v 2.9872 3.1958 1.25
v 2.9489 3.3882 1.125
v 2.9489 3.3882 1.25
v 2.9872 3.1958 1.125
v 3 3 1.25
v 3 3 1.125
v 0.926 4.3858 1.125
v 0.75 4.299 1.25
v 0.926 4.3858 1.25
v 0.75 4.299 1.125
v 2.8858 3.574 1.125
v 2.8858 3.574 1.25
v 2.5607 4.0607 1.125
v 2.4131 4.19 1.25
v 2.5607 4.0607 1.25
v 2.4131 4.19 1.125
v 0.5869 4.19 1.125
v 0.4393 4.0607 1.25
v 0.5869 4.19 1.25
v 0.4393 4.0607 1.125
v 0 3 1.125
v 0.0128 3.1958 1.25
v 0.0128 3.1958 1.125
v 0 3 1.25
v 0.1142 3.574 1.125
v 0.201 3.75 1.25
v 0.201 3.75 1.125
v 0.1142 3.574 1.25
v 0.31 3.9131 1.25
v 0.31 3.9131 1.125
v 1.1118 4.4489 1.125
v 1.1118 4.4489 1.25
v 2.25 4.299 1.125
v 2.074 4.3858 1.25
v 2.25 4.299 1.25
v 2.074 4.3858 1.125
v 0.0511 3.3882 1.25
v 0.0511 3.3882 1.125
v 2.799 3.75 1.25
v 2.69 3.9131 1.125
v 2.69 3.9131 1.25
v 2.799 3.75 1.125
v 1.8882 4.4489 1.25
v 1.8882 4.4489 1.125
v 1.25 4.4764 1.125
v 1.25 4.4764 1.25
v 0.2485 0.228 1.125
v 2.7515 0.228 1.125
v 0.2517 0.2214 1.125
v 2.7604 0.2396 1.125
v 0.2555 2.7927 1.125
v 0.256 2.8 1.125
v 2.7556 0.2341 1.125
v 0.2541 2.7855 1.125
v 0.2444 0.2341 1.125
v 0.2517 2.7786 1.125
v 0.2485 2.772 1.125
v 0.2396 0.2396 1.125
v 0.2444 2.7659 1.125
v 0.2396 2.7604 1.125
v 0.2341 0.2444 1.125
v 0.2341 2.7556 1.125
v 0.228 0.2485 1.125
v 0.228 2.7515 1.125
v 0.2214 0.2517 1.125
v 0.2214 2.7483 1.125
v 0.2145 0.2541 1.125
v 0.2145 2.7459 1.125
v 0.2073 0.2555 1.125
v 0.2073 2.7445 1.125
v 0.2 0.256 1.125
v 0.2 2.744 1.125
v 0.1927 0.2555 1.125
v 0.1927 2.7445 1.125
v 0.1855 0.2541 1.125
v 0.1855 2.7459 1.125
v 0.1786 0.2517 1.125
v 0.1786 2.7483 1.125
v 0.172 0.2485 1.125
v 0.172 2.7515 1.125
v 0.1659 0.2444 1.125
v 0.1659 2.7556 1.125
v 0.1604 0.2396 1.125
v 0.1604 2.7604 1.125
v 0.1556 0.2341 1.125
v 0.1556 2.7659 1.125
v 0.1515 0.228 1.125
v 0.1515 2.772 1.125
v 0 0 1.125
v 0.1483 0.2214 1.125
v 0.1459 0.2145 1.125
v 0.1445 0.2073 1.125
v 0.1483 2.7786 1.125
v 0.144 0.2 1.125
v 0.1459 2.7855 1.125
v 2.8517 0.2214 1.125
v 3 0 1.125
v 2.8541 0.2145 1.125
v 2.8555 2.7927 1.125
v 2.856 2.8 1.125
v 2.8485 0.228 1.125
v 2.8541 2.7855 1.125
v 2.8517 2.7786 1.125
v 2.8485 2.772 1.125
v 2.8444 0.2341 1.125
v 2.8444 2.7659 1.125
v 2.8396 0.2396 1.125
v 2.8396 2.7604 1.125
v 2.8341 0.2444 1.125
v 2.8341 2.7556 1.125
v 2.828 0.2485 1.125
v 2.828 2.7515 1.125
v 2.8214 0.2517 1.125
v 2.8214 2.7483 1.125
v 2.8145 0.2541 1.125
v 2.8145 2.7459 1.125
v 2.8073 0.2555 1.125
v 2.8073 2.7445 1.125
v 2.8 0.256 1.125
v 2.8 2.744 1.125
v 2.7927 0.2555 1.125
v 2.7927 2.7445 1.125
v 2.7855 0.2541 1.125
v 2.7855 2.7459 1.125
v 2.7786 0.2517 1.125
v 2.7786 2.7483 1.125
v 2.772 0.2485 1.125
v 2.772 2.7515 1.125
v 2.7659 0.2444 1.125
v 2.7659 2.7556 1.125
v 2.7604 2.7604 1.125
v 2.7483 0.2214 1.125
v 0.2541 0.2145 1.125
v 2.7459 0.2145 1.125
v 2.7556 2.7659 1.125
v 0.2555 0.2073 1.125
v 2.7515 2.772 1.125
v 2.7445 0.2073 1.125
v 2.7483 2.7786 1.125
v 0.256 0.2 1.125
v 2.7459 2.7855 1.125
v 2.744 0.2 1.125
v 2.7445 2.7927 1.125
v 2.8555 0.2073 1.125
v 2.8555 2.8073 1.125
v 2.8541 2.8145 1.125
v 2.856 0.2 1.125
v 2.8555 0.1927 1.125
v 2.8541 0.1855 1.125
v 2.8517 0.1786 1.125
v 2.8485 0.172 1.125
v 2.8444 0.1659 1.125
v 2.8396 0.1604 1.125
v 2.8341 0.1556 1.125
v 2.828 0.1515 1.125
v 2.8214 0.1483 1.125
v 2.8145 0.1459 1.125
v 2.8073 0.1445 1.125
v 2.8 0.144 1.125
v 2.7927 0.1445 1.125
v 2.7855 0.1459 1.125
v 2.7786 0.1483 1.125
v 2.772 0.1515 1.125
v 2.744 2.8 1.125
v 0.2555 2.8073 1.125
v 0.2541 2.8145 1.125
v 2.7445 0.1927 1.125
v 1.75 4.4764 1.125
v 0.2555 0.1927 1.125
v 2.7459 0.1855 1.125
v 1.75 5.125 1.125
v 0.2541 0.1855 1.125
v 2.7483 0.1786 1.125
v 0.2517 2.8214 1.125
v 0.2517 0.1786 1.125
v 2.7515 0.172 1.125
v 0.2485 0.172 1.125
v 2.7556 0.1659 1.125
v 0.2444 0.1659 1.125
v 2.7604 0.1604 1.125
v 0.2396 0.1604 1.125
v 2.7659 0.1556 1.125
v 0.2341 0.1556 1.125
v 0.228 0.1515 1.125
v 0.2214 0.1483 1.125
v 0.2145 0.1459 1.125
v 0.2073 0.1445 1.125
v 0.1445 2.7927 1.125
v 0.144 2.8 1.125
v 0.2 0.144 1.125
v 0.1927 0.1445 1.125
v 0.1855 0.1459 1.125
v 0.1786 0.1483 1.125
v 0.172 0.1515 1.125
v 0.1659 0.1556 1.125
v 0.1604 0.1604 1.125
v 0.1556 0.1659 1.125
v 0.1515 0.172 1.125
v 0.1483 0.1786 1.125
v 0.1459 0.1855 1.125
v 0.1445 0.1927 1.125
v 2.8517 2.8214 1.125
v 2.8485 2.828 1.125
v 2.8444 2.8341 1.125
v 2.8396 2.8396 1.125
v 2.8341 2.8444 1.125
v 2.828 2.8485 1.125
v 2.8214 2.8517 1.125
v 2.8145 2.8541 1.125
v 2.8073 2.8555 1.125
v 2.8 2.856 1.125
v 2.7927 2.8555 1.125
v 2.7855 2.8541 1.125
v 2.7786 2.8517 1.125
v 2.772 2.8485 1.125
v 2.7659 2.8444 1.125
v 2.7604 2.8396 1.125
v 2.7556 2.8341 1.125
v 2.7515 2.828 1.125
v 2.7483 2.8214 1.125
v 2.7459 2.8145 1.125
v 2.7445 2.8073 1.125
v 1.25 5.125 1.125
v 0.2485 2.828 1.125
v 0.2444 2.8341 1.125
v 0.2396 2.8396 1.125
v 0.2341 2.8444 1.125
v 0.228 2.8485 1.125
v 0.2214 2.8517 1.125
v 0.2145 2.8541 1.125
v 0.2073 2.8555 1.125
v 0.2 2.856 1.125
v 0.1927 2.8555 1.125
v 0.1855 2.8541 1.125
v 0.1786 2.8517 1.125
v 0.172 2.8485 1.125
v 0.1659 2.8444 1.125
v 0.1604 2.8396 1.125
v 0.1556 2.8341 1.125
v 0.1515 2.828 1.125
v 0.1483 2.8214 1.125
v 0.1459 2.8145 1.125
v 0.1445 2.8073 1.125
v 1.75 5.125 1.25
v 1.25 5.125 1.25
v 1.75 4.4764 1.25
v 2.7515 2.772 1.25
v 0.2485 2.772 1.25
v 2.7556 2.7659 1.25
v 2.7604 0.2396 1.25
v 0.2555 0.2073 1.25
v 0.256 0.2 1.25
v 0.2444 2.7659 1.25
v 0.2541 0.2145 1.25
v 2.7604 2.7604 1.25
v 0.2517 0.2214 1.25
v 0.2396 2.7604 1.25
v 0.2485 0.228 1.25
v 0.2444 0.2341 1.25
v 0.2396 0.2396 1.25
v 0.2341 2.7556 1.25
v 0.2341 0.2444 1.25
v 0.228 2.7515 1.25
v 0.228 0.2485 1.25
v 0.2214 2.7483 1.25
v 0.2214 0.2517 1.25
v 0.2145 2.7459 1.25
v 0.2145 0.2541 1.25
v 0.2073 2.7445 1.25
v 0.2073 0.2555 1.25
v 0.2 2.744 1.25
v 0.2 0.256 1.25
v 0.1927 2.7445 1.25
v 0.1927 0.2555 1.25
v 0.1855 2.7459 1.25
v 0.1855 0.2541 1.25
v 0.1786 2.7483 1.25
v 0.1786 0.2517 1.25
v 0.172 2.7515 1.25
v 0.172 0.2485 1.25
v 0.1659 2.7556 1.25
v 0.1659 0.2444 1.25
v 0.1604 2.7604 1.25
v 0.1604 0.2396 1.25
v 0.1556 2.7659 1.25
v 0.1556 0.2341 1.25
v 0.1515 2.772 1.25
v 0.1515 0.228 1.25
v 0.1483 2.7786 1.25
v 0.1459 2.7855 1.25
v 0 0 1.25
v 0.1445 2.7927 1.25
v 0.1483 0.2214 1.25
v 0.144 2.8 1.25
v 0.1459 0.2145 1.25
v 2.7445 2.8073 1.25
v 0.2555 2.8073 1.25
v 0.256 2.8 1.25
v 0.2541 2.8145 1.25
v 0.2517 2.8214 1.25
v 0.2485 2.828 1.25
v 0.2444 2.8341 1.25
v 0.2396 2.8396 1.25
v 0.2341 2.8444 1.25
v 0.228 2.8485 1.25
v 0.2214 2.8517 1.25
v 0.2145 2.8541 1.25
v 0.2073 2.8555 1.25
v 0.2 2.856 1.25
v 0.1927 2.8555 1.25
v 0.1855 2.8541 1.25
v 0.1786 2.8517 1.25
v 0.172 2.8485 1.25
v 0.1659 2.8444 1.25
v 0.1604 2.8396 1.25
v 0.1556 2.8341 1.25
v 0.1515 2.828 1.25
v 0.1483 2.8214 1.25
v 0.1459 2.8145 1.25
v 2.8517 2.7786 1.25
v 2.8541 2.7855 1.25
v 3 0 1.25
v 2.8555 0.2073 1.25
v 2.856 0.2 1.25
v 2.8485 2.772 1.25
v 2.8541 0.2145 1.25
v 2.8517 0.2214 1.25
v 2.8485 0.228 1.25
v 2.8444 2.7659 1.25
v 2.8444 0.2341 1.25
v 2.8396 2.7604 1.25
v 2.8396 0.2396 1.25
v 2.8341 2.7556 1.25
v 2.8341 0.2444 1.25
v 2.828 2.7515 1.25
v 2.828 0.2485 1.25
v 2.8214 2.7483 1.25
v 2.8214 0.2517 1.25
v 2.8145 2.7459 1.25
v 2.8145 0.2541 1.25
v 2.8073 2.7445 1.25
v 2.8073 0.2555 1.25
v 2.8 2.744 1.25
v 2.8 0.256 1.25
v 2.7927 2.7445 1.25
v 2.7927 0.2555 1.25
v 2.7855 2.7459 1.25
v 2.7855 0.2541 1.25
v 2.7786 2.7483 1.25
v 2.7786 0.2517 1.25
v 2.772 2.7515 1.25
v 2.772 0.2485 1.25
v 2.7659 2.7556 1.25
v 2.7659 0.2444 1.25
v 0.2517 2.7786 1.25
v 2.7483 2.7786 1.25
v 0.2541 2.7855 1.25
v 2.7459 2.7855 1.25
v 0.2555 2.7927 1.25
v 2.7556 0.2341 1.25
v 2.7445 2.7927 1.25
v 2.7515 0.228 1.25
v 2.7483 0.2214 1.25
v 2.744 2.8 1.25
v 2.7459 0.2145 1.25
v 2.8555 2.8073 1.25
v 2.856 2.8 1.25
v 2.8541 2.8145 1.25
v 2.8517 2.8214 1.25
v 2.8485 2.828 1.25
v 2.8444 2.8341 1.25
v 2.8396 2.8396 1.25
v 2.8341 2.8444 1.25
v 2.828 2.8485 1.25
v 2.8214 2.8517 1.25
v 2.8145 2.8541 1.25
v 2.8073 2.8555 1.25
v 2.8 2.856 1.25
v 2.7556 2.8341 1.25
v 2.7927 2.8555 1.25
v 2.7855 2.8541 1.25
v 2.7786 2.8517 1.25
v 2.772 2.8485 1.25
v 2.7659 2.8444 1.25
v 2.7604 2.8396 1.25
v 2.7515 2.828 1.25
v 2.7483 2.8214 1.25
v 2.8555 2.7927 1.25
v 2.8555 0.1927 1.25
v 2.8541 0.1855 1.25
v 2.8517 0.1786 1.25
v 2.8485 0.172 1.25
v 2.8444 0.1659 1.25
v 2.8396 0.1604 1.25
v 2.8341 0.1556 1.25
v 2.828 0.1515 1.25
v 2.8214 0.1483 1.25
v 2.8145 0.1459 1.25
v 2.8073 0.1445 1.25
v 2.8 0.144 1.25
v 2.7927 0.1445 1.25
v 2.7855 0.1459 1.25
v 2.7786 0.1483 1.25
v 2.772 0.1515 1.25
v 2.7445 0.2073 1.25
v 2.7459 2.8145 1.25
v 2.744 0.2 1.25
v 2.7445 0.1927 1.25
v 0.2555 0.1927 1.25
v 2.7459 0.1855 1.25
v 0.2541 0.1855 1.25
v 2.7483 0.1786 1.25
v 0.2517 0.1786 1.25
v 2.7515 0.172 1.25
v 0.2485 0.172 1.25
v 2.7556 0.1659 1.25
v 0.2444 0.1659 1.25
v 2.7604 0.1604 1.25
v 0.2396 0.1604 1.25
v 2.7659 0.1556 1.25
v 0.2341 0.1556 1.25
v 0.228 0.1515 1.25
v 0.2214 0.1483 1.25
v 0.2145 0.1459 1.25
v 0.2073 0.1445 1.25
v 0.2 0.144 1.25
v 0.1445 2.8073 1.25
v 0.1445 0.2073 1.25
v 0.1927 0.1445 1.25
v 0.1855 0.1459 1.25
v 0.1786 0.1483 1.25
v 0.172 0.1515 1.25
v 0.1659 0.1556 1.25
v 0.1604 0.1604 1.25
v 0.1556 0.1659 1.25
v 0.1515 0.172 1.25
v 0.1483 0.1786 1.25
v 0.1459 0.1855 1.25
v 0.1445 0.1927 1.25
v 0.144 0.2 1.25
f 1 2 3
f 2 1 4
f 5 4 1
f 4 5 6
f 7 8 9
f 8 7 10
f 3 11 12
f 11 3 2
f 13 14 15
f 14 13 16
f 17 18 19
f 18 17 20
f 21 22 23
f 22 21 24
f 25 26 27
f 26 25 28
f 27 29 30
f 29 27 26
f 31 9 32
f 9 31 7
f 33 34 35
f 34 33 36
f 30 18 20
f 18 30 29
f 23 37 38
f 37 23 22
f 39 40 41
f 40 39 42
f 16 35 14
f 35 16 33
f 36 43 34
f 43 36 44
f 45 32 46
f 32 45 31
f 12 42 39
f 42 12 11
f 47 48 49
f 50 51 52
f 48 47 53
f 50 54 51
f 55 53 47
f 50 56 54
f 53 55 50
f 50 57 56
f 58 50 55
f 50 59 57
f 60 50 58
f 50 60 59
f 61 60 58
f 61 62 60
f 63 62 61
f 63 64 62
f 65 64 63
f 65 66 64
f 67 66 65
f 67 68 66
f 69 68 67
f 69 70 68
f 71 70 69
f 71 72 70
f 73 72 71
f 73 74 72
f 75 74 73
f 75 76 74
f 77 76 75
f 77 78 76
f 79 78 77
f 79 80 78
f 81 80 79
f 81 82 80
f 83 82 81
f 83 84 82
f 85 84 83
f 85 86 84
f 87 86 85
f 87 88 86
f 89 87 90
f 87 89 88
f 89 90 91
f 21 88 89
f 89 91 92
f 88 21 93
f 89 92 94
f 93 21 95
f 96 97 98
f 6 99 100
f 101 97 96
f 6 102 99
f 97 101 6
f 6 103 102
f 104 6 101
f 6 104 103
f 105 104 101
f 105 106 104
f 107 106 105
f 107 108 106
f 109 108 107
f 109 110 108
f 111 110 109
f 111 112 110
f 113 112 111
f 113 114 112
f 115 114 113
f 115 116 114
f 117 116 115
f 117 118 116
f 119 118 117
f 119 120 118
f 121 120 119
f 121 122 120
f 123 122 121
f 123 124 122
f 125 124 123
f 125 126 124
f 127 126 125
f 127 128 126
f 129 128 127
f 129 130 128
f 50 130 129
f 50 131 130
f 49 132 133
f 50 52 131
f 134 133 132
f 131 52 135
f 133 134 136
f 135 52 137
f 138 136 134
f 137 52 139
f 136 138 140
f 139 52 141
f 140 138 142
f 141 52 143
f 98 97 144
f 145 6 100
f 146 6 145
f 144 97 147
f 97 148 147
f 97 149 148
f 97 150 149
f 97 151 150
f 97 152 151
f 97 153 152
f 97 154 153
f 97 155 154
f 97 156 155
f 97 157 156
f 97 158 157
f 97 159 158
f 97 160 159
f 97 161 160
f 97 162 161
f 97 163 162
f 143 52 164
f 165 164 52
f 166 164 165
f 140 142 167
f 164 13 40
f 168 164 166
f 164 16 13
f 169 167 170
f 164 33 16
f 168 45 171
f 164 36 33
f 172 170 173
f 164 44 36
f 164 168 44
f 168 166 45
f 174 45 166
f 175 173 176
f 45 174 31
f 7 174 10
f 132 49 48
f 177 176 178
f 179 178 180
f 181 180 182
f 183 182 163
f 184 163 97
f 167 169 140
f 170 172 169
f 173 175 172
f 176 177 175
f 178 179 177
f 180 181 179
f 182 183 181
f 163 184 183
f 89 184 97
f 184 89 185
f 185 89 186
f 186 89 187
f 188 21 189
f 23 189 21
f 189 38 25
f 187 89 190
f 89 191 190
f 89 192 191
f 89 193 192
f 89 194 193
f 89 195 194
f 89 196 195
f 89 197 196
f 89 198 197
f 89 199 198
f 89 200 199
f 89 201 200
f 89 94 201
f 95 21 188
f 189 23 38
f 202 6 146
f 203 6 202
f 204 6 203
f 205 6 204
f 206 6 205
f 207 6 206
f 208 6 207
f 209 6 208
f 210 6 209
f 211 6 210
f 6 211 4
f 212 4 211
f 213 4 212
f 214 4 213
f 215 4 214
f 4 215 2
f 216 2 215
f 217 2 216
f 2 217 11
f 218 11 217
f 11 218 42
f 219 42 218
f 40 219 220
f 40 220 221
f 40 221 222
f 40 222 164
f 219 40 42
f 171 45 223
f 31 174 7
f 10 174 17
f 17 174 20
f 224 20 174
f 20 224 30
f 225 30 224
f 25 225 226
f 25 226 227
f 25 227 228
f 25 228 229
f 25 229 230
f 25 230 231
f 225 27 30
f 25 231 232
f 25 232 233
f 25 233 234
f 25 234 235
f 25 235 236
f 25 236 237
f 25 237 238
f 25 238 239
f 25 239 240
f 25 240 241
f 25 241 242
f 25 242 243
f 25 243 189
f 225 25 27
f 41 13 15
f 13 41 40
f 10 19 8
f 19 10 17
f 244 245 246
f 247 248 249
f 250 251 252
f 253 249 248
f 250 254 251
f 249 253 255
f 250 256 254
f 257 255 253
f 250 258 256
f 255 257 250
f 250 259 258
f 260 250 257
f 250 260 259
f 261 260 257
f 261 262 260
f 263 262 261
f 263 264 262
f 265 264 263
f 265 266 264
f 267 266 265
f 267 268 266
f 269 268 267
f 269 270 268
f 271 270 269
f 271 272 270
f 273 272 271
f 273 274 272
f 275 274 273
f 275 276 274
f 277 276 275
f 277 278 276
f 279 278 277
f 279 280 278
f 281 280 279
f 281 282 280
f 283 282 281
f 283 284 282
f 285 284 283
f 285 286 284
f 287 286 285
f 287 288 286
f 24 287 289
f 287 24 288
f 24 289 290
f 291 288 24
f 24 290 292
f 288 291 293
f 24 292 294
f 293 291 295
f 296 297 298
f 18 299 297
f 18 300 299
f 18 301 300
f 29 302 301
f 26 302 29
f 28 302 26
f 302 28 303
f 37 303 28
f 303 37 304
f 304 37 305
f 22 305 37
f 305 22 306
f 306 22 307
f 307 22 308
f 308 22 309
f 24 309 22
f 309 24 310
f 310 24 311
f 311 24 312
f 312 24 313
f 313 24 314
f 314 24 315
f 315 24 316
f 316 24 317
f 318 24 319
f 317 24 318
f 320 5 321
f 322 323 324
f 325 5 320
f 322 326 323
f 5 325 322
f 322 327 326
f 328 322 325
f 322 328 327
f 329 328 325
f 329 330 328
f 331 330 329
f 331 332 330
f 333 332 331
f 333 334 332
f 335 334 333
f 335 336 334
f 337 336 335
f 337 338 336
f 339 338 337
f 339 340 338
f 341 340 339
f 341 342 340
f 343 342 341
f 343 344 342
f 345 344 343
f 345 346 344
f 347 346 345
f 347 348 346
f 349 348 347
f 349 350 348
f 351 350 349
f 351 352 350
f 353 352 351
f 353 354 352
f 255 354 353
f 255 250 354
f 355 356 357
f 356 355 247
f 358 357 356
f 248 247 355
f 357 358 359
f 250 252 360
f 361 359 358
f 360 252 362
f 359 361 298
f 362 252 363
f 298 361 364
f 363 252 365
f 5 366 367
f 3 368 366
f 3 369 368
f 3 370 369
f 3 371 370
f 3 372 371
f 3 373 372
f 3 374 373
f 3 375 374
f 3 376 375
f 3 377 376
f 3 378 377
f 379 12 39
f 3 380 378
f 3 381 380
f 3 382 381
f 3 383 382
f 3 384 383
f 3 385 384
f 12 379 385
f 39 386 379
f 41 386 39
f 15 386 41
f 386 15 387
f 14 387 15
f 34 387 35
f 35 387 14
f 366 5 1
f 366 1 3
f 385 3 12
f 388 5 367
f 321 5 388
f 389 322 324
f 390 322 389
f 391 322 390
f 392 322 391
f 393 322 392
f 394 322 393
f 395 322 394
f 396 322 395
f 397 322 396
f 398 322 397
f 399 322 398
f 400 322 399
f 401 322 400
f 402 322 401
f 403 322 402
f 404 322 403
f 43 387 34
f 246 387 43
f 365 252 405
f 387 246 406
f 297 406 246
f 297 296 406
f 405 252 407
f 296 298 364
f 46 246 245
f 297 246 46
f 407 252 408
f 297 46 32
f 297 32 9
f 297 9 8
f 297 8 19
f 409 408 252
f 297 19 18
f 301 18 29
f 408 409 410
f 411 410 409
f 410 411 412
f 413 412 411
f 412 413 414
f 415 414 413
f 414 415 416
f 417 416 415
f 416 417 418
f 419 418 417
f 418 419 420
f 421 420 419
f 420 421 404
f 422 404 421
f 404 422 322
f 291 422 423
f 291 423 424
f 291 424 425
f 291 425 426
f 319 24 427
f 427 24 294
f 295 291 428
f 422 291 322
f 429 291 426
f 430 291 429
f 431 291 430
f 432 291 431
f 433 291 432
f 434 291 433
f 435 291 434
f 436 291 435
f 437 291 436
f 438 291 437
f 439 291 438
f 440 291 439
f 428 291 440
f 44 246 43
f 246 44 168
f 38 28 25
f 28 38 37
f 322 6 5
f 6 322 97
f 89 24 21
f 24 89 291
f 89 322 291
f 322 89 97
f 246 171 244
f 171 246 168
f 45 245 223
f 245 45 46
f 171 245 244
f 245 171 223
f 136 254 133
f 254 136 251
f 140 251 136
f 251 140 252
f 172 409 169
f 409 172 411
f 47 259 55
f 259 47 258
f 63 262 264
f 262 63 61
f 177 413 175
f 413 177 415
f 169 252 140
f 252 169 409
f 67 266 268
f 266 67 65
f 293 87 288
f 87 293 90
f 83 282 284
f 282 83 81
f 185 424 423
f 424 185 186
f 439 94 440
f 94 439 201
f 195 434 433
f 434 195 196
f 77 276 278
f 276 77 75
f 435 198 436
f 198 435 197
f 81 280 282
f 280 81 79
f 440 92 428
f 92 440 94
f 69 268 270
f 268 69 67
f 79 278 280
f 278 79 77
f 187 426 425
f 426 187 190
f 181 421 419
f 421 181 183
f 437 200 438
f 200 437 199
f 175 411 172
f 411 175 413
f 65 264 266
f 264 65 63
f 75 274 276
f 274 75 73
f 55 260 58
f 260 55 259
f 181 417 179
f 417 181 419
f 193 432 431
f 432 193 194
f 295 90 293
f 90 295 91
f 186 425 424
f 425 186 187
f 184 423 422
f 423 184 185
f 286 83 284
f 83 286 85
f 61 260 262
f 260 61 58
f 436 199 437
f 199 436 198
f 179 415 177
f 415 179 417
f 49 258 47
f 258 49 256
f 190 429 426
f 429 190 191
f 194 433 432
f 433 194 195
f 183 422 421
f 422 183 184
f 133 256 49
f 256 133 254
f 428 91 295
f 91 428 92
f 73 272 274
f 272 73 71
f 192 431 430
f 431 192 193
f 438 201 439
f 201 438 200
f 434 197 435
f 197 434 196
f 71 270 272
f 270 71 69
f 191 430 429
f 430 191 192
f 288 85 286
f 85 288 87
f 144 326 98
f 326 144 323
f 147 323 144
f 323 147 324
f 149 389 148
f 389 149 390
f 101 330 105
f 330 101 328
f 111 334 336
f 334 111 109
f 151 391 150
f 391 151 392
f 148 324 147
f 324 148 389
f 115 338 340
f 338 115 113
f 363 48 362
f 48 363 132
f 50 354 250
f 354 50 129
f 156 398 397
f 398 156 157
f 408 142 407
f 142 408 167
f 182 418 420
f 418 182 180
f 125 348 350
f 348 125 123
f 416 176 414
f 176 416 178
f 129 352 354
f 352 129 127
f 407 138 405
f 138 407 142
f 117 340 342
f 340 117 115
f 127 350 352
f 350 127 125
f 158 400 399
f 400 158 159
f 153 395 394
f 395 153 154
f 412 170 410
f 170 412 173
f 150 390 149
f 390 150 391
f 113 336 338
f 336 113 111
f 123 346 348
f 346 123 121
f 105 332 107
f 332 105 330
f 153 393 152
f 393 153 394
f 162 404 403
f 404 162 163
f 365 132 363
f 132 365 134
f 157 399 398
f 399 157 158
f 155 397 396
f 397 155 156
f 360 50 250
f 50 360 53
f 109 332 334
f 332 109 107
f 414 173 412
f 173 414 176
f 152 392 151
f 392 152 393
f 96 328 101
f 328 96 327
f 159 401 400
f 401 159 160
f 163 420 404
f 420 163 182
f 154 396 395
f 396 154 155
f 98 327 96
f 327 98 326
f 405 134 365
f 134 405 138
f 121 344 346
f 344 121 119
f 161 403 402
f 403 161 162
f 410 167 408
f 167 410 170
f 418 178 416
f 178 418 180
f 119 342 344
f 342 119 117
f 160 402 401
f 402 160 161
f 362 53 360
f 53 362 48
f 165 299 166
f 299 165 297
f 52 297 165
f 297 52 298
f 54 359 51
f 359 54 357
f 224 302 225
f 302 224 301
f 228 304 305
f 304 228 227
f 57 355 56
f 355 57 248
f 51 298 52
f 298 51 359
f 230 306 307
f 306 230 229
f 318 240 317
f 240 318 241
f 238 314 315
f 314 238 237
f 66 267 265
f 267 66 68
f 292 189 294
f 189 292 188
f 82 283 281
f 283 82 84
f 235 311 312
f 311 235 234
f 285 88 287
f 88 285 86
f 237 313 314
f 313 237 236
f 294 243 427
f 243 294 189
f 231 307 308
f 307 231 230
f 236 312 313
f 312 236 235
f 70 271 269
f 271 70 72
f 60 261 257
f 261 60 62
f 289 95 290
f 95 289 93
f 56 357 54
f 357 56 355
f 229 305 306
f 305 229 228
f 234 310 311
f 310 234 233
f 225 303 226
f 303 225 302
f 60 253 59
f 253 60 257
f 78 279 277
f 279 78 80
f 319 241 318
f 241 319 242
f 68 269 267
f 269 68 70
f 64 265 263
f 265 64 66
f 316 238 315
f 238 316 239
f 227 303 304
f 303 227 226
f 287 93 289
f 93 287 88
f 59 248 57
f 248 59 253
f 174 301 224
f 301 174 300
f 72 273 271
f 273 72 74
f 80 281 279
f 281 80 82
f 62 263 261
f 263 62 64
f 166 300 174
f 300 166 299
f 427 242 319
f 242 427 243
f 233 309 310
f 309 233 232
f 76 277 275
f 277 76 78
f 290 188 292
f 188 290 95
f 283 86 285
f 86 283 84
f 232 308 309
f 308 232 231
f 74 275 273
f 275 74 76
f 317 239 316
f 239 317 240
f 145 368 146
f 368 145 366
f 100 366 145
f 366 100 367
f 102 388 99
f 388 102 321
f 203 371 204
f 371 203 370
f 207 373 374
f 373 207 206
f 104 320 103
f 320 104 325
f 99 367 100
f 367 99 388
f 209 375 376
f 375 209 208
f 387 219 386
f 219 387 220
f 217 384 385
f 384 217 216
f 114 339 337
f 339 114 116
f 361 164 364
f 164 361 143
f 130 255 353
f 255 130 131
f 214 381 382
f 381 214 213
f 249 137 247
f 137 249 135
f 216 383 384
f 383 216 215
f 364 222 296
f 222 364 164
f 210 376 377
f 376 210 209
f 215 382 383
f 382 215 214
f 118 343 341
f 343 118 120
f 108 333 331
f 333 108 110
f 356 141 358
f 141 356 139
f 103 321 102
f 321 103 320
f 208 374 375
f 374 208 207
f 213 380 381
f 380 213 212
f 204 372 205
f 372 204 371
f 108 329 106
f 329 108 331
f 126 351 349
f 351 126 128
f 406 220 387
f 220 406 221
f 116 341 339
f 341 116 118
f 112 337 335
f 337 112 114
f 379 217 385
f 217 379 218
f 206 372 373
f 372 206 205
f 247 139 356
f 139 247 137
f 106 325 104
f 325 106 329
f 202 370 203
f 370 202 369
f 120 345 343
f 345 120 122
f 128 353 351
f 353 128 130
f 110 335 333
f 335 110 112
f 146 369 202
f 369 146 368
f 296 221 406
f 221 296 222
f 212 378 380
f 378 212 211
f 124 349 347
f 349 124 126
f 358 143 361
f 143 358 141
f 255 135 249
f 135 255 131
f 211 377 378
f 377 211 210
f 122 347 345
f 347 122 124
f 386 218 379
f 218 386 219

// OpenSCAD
$fn = 48;

difference(){
	union() {
		translate(v = [0, 0, 1.1250000000]) {
			union() {
				translate(v = [1.2500000000, 4.3750000000, 0]) {
					cube(size = [0.5000000000, 0.7500000000, 0.1250000000]);
				}
				difference() {
					union() {
						translate(v = [1.5000000000, 3, 0]) {
							cylinder(h = 0.1250000000, r = 1.5000000000);
						}
						union() {
							difference() {
								translate(v = []) {
									cube(size = [3, 3, 0.1250000000]);
								}
							}
							translate(v = [0.2000000000, 0.2000000000, 0]) {
							}
							translate(v = [2.8000000000, 0.2000000000, 0]) {
							}
							translate(v = [0.2000000000, 2.8000000000, 0]) {
							}
							translate(v = [2.8000000000, 2.8000000000, 0]) {
							}
						}
						translate(v = [1.5000000000, 3, 0]) {
							cylinder(h = 0.1250000000, r = 1.5000000000);
						}
					}
					translate(v = [0.8125000000, 4]) {
						union() {
							translate(v = [0, 0, 0]) {
								difference() {
									difference() {
										circle(r = 0.7500000000);
										rotate(a = -60) {
											translate(v = [0, -0.7500000000, 0]) {
												square(center = true, size = [2.2500000000, 1.5000000000]);
											}
										}
										rotate(a = -180) {
											translate(v = [0, -0.7500000000, 0]) {
												square(center = true, size = [2.2500000000, 1.5000000000]);
											}
										}
									}
									difference() {
										circle(r = 0.6250000000);
										rotate(a = -60) {
											translate(v = [0, -0.6250000000, 0]) {
												square(center = true, size = [1.8750000000, 1.2500000000]);
											}
										}
										rotate(a = -180) {
											translate(v = [0, -0.6250000000, 0]) {
												square(center = true, size = [1.8750000000, 1.2500000000]);
											}
										}
									}
								}
							}
							translate(v = [1.3750000000, 0, 0]) {
								mirror(v = [90, 0, 0]) {
									difference() {
										difference() {
											circle(r = 0.7500000000);
											rotate(a = -60) {
												translate(v = [0, -0.7500000000, 0]) {
													square(center = true, size = [2.2500000000, 1.5000000000]);
												}
											}
											rotate(a = -180) {
												translate(v = [0, -0.7500000000, 0]) {
													square(center = true, size = [2.2500000000, 1.5000000000]);
												}
											}
										}
										difference() {
											circle(r = 0.6250000000);
											rotate(a = -60) {
												translate(v = [0, -0.6250000000, 0]) {
													square(center = true, size = [1.8750000000, 1.2500000000]);
												}
											}
											rotate(a = -180) {
												translate(v = [0, -0.6250000000, 0]) {
													square(center = true, size = [1.8750000000, 1.2500000000]);
												}
											}
										}
									}
								}
							}
							translate(v = [0.6250000000, 0, -0.1000000000]) {
								cube(size = [0.1250000000, 0.4000000000, 0.2260000000]);
							}
						}
					}
				}
			}
		}
	}
	/* Holes Below*/
	union(){
		translate(v = [0, 0, 1.1250000000]){
			union(){
				difference(){
					union(){
						union(){
							translate(v = [0.2000000000, 0.2000000000, 0]){
								union() {
									cylinder(h = 0.1875000000, r = 0.0560000000);
									translate(v = [0, 0, 0.1875000000]) {
										cylinder(h = 0.1000000000, r = 0.1250000000);
									}
								}
							}
							translate(v = [2.8000000000, 0.2000000000, 0]){
								union() {
									cylinder(h = 0.1875000000, r = 0.0560000000);
									translate(v = [0, 0, 0.1875000000]) {
										cylinder(h = 0.1000000000, r = 0.1250000000);
									}
								}
							}
							translate(v = [0.2000000000, 2.8000000000, 0]){
								union() {
									cylinder(h = 0.1875000000, r = 0.0560000000);
									translate(v = [0, 0, 0.1875000000]) {
										cylinder(h = 0.1000000000, r = 0.1250000000);
									}
								}
							}
							translate(v = [2.8000000000, 2.8000000000, 0]){
								union() {
									cylinder(h = 0.1875000000, r = 0.0560000000);
									translate(v = [0, 0, 0.1875000000]) {
										cylinder(h = 0.1000000000, r = 0.1250000000);
									}
								}
							}
						}
					}
				}
			}
		}
	} /* End Holes */ 
}
/***********************************************
*********      SolidPython code:      **********
************************************************
 
#! /usr/bin/env python
# -*- coding: UTF-8 -*-
from __future__ import division
import os
import sys
import re

# Assumes SolidPython is in site-packages or elsewhwere in sys.path
from solid import *
from solid.utils import *

SEGMENTS = 48

eccentric_plate_x = 3;
eccentric_plate_y = 3;
eccentric_plate_z = 0.125;

def eccentric_design():
    s = -60
    e = 0
    rad = .75
    h=.125
    myarc = difference()(
        arc(rad=rad, start_degrees=s, end_degrees=e),
        arc(rad=rad-.125, start_degrees=s, end_degrees=e),
    )
    a = union() (
        translate([0,0,0])( myarc,),
        translate([rad*2-.125,0,0])( mirror([90,0,0])( myarc ),),
        translate( [rad-.125,0,-.10] ) (
            cube([.125,.4,.226])(),  
        ),
        
    )
    return a

@bom_part("Eccentric Plate Center")
def eccentric_plate_center(hole_diameter=2.5):
    #points = [ [0,0,0], [1.25,1.25,0], [1.25,1.75,0], [1.75, 1.75, 0], [1.75,1.25,0], [3,0,0]] 
    a = union() (
        translate([eccentric_plate_x/2-.25, eccentric_plate_y+eccentric_plate_x/2-.125, 0])(cube([.5,.75, .125]) ()),
        difference()(
            union() (
                translate([eccentric_plate_x/2, eccentric_plate_y, 0])(cylinder( r=eccentric_plate_x/2, h=.125) ()),
                eccentric_plate(hole_diameter),
                #difference()(
                #    eccentric_plate(hole_diameter),
                #    translate([eccentric_plate_x/2, eccentric_plate_y/2, 0])(cylinder( r=eccentric_plate_x/2, h=.125) ()),
                #),
                #eccentric_plate(hole_diameter),
                #the top cylinder
                translate([eccentric_plate_x/2, eccentric_plate_y, 0])(cylinder( r=eccentric_plate_x/2, h=.125) ()),
                #translate( [ 0, eccentric_plate_y, 0 ] ) (
                #    translate([-5,0,0])(polygon( points )()),
                #),
    
            ),
            translate([eccentric_plate_x/2-.75+.0625, eccentric_plate_y+1]) (eccentric_design()),
        )


    # attempt at a design
    #rotate([0,0,0])(cube([.4,.125,.125])()),
    #translate([.40,0.0625,0])(rotate([0,0,45])(cube([.3,.125,.125])())),
    #translate([.40,-.0625,0])(rotate([0,0,-45])(cube([.3,.125,.125])())),
    )
    return a

@bom_part("Eccentric Plate")
def eccentric_plate(hole_diameter=2.5):
    """ 
        this is the square part of all three plates
        the top plate should have the four corner holes
        countersunk, and the bottom plate is tapped.
        And the middle plate is probaby unioned with the 
        top section design.

        the top and bottom plate hole_diameters should be 0.05-0.1
        smaller than the disk and the middle plate diameter
    """
    a = union() (
    difference() (
        # the plate
        translate([]) (
            cube([eccentric_plate_x, eccentric_plate_y, eccentric_plate_z]),
        ),
        # the screw holes
    
        ),
        translate([.2,.2,0]) (hole()(screw('4-40'))),
        translate([eccentric_plate_x-.2,.2,0]) (hole()(screw('4-40'))),
        translate([.2,eccentric_plate_y-.2,0]) (hole()(screw('4-40'))),
        translate([eccentric_plate_x-.2,eccentric_plate_y-.2,0]) (hole()( screw('4-40'))),
    )
    return a

##### copied from utils, because reasons...

# =======================
# = Hardware dimensions =
# =======================
screw_dimensions = {
    '4-40': {'nut_thickness': 3/32, 'nut_inner_diam': .112, 'nut_outer_diam': .25, 'screw_outer_diam': .112, 'cap_diam': .25, 'cap_height': .10},

}
def screw(screw_type='4-40', screw_length=3/16):
    dims = screw_dimensions[screw_type.lower()]
    shaft_rad = dims['screw_outer_diam'] / 2
    cap_rad = dims['cap_diam'] / 2
    cap_height = dims['cap_height']

    ret = union()(
        cylinder(shaft_rad, screw_length),
        up(screw_length)(
            cylinder(cap_rad, cap_height)
        )
    )
    return ret

def assembly():
    # Your code here!
    a = union() (
        #eccentric_plate(2.5),
        translate([0,0,eccentric_plate_z+1]) (eccentric_plate_center(2.6)),
        #translate([0,0,eccentric_plate_z*2+2]) (eccentric_plate(2.5)),
        #translate([5,0,0]) ( eccentric_design())
    )

    return a

if __name__ == '__main__':
    a = assembly()
    out_dir = sys.argv[1] if len(sys.argv) > 1 else os.curdir
    file_out = os.path.join(out_dir, sys.argv[0])
    scad_render_to_file(a, file_header='$fn = %s;' % SEGMENTS, include_orig_code=True)


    print("%(__file__)s: SCAD file written to: \n%(file_out)s" % vars())
    bom = bill_of_materials()
    print(bom)



 
 
************************************************/
